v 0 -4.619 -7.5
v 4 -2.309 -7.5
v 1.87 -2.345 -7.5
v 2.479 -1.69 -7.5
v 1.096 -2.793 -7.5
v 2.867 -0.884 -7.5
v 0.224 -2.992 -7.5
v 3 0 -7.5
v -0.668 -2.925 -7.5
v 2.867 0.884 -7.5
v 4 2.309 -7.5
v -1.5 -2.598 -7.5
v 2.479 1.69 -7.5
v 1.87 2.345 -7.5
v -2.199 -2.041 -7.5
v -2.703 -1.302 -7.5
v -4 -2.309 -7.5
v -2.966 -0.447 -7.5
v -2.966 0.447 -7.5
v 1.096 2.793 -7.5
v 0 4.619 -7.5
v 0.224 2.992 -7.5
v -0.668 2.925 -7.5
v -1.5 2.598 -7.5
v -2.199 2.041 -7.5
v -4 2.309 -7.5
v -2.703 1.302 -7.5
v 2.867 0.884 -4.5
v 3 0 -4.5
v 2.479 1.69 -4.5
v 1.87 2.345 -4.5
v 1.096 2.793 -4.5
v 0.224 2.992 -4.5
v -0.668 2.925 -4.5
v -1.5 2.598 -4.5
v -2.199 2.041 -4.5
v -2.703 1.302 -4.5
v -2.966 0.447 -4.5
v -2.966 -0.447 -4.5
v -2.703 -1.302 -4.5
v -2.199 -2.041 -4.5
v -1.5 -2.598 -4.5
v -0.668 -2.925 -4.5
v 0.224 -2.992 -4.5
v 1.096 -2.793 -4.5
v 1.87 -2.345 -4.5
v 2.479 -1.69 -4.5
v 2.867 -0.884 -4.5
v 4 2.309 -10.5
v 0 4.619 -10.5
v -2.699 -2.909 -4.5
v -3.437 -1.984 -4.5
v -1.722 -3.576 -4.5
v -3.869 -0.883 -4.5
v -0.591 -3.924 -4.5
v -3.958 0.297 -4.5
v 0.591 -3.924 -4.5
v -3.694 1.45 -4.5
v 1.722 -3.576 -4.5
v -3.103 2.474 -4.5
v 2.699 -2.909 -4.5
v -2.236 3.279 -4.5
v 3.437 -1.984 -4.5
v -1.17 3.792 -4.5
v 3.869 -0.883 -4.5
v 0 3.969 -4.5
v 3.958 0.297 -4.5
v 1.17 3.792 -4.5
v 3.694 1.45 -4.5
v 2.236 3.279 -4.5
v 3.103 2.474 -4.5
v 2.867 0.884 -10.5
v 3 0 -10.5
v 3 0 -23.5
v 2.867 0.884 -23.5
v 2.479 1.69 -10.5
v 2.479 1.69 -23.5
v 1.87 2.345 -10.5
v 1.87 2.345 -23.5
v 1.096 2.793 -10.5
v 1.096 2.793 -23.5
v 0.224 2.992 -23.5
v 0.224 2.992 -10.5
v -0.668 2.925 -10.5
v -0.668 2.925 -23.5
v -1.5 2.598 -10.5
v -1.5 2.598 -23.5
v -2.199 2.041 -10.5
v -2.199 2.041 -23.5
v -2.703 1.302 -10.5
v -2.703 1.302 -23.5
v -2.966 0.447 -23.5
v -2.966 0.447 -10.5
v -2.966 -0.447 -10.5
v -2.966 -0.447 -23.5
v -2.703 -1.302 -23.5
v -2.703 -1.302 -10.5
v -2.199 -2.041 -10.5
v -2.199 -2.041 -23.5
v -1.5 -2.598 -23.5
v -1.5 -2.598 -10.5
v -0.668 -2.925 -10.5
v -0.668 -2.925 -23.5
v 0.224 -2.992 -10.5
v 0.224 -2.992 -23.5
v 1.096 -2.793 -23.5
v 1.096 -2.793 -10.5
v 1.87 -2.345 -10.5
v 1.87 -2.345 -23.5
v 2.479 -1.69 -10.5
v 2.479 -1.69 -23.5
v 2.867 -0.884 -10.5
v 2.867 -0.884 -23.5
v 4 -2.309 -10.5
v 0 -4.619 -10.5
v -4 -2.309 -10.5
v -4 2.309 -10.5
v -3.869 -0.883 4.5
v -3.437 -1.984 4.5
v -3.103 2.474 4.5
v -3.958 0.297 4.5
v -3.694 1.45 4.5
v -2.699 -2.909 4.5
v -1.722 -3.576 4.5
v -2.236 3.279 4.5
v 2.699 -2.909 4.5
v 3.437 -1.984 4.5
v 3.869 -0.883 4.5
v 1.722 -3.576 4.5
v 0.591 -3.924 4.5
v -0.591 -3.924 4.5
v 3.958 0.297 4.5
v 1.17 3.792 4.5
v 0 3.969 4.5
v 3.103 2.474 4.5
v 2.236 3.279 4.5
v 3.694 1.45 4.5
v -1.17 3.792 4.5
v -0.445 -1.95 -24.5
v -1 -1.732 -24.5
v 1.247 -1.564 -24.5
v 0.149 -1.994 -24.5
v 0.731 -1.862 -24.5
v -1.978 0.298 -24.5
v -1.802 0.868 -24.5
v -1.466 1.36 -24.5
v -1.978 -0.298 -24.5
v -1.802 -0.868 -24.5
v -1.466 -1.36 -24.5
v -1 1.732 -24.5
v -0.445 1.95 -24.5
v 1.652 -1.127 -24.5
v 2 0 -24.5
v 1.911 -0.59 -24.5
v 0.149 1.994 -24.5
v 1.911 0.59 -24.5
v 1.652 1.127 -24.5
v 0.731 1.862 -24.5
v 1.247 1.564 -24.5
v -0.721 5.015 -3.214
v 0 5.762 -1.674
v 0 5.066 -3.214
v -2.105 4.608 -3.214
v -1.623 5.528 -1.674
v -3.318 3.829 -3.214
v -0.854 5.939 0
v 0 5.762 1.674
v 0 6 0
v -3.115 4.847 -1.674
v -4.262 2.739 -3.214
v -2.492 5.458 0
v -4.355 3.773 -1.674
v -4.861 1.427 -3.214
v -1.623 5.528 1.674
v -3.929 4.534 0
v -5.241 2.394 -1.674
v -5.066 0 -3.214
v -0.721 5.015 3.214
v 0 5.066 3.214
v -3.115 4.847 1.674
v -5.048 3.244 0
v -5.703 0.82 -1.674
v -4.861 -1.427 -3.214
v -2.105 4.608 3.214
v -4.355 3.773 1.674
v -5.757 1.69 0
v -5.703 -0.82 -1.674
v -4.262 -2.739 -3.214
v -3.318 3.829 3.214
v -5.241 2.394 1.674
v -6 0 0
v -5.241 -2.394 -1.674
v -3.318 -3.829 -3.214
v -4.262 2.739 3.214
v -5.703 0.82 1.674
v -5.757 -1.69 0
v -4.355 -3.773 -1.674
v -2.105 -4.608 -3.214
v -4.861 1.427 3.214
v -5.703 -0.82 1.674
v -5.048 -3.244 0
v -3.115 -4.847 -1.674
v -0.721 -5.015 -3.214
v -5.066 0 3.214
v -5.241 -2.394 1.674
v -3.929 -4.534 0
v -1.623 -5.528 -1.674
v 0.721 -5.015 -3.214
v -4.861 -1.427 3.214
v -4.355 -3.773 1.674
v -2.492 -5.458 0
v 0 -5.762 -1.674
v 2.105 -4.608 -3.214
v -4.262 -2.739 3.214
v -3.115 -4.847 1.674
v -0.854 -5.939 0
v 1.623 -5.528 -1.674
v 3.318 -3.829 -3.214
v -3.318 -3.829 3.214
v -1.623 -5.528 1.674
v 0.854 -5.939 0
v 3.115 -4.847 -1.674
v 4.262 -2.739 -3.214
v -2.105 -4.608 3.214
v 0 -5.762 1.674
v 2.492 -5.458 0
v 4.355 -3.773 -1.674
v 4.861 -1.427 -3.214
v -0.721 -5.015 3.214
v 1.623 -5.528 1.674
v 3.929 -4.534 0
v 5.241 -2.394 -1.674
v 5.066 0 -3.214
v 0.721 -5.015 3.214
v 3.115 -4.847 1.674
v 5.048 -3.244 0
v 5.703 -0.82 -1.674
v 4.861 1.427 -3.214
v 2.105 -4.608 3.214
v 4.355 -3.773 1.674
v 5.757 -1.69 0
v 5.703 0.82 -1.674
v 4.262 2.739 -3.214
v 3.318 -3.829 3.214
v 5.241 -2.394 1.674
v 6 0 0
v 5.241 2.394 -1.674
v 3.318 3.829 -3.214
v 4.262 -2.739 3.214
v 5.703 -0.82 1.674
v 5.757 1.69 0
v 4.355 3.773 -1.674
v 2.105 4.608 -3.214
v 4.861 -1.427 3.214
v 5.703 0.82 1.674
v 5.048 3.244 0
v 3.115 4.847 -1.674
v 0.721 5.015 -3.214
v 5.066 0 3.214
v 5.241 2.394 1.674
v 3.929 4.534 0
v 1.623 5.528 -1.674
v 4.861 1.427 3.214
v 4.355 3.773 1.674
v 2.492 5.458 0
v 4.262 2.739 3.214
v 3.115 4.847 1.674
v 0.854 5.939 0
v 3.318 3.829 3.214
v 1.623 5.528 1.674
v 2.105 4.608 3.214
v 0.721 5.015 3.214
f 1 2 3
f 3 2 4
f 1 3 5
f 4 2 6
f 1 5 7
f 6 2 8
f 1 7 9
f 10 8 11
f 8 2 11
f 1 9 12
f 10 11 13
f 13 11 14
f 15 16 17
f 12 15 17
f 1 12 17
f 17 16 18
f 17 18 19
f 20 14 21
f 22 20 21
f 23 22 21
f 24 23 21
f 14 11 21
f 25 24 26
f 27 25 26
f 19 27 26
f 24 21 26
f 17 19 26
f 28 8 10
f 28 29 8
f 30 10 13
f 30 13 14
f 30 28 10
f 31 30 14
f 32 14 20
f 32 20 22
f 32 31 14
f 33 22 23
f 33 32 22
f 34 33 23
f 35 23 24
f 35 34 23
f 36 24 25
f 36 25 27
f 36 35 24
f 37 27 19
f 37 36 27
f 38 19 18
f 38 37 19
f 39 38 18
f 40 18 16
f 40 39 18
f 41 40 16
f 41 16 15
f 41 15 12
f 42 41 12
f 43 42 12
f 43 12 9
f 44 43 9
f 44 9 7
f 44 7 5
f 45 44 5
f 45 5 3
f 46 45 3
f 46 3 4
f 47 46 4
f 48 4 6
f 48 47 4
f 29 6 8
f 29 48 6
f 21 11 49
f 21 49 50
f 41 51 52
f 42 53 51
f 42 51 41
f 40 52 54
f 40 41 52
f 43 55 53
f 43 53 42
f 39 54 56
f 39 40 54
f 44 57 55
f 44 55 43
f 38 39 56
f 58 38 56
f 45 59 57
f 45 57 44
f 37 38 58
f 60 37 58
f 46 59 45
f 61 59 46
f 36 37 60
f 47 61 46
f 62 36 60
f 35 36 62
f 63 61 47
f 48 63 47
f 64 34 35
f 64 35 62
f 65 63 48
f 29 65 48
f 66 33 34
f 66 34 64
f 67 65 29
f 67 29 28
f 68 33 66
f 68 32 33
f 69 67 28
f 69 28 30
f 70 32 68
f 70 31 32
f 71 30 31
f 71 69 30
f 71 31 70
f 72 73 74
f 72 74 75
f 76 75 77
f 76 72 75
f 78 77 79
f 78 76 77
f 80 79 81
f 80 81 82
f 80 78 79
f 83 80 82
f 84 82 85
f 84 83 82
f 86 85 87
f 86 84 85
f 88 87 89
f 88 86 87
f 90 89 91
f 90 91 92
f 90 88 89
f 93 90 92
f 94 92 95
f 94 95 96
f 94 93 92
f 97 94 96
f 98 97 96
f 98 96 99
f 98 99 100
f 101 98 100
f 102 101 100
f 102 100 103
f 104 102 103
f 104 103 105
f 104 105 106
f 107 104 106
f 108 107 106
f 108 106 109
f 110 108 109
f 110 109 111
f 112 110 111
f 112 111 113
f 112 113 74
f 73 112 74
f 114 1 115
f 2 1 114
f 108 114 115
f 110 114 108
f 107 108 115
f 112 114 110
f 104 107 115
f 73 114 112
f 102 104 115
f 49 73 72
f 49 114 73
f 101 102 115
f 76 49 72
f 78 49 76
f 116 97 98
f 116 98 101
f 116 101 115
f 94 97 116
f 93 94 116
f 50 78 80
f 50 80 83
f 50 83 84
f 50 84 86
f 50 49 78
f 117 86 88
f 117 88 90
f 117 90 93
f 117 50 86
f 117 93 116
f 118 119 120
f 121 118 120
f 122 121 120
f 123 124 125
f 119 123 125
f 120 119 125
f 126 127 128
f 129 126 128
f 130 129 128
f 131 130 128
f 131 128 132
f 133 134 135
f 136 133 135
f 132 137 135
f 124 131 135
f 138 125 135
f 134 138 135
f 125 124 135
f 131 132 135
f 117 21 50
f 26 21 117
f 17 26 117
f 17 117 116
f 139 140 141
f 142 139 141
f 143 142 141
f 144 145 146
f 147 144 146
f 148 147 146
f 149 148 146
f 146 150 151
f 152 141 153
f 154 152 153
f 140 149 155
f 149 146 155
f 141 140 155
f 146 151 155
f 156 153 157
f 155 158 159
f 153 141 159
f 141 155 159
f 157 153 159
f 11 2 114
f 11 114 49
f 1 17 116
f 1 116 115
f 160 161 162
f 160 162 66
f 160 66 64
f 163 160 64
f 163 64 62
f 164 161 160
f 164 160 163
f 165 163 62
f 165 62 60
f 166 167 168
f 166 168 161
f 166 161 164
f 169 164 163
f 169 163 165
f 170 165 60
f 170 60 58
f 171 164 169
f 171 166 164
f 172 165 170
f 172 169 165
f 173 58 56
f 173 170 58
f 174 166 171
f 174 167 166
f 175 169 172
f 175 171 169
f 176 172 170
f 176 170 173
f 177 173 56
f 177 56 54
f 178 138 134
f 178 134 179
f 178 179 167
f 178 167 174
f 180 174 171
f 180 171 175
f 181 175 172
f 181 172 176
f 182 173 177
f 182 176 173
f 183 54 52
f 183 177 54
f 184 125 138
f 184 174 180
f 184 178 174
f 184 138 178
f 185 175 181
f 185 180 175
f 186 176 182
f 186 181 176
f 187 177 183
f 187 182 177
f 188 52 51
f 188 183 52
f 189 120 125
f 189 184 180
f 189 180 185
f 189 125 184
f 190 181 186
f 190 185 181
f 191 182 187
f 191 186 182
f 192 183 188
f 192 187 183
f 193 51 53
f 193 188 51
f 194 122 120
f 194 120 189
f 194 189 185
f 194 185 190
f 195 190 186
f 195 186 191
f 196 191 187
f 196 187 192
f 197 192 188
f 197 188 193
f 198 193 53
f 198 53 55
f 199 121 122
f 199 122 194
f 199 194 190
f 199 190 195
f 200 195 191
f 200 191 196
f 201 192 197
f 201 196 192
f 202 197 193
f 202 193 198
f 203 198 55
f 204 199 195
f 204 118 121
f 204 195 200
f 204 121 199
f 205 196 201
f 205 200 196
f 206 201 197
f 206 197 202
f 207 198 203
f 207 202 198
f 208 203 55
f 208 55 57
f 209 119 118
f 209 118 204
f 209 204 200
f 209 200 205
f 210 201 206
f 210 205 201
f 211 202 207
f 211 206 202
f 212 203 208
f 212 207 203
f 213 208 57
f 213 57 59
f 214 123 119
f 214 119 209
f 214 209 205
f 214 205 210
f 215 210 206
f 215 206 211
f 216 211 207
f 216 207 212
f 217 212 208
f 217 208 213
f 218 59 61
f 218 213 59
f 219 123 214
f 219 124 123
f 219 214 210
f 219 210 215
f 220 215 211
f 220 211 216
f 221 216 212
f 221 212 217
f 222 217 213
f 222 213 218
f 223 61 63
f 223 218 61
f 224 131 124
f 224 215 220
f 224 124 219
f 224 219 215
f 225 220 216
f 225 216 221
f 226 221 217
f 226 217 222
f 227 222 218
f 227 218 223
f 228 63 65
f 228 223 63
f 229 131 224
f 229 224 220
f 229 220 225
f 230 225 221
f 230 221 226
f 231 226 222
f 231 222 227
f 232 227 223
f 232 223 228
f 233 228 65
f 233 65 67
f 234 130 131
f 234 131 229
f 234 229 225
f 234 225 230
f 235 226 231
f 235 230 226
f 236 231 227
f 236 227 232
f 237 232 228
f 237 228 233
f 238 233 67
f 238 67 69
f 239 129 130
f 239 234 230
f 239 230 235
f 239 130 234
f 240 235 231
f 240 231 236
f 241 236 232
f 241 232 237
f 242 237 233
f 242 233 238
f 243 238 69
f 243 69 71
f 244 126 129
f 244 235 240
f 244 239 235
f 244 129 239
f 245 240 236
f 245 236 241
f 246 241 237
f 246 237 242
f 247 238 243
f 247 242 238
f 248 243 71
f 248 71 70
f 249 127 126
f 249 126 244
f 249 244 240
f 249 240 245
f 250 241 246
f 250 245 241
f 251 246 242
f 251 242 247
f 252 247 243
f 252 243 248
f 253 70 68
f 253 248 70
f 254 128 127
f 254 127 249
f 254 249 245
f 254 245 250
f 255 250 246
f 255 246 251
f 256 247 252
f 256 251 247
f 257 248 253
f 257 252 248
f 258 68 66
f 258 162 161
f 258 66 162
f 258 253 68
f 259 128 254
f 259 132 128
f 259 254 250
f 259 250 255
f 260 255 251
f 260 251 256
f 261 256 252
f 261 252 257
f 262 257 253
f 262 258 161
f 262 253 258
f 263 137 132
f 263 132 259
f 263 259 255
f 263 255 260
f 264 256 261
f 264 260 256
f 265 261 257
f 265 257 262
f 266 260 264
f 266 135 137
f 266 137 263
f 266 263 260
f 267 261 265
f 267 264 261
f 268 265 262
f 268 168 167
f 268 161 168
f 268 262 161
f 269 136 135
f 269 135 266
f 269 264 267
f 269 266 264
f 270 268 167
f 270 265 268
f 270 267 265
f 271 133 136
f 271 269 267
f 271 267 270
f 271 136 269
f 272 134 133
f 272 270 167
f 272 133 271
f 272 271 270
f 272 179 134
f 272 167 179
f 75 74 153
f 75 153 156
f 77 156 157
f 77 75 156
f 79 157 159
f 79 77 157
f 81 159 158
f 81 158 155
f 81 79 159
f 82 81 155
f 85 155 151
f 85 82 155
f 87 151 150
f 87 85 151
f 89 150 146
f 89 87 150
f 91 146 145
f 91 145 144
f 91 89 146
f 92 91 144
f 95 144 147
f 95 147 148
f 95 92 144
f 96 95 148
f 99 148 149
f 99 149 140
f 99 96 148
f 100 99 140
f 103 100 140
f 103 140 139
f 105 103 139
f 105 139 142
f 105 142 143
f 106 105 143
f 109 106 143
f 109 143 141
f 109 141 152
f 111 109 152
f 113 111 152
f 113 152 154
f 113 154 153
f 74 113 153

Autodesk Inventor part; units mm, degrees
ref_plane "YZ Plane" through (0, 0, 0) normal (1, 0, 0) x (0, 1, 0)
ref_plane "XZ Plane" through (0, 0, 0) normal (0, 1, 0) x (-1, 0, 0)
sketch "Sketch1" plane through (0, 0, 0) normal (1, 0, 0) x (0, 1, 0)
  circle A0 centre (0, 0) radius 6
  line L0 (0, 6) -> (0, -6)
  line L1 (3, -5.1962) -> (3, 5.1962)
  line L2 (3.9686, 4.5) -> (3, 4.5)
  line L3 (3.9686, -4.5) -> (3, -4.5)
  dimension "d0" = 6
  dimension "d1" = 9
  dimension "d2" = 12
revolve "Revolution1" add sketch "Sketch1" angle 360 about axis through (0, 0, 6) along (0, 0, -1) contours A0 L3 L1 L2
sketch "Sketch2" plane through (0, 0, 4.5) normal (0, 0, 1) x (1, 0, 0)
  circle A0 centre (0, 0) radius 3
  dimension "d4" = 6
extrude "Extrusion1" add sketch "Sketch2" against normal blind 29
ref_plane "Work Plane1" through (0, 0, -7.5) normal (0, 0, -1) x (-1, 0, 0)
sketch "Sketch3" plane through (0, 0, -7.5) normal (0, 0, -1) x (-1, 0, 0)
  line L0 (4, -2.3094) -> (0, -4.6188)
  line L1 (0, -4.6188) -> (-4, -2.3094)
  line L2 (-4, -2.3094) -> (-4, 2.3094)
  line L3 (-4, 2.3094) -> (0, 4.6188)
  line L4 (0, 4.6188) -> (4, 2.3094)
  line L5 (4, 2.3094) -> (4, -2.3094)
  point P0 (0, 0)
  point P1 (0, 0)
  dimension "d8" = 8
extrude "Extrusion2" add sketch "Sketch3" along normal blind 3
chamfer "Chamfer1" distance 1 angle 45 1 edges at (-3, 0, -24.5)
thread "Thread1" size "M6x1" class "6g" standard "ISO Metric profile" length 12
properties part number "Ball" material "Steel, Carbon"
